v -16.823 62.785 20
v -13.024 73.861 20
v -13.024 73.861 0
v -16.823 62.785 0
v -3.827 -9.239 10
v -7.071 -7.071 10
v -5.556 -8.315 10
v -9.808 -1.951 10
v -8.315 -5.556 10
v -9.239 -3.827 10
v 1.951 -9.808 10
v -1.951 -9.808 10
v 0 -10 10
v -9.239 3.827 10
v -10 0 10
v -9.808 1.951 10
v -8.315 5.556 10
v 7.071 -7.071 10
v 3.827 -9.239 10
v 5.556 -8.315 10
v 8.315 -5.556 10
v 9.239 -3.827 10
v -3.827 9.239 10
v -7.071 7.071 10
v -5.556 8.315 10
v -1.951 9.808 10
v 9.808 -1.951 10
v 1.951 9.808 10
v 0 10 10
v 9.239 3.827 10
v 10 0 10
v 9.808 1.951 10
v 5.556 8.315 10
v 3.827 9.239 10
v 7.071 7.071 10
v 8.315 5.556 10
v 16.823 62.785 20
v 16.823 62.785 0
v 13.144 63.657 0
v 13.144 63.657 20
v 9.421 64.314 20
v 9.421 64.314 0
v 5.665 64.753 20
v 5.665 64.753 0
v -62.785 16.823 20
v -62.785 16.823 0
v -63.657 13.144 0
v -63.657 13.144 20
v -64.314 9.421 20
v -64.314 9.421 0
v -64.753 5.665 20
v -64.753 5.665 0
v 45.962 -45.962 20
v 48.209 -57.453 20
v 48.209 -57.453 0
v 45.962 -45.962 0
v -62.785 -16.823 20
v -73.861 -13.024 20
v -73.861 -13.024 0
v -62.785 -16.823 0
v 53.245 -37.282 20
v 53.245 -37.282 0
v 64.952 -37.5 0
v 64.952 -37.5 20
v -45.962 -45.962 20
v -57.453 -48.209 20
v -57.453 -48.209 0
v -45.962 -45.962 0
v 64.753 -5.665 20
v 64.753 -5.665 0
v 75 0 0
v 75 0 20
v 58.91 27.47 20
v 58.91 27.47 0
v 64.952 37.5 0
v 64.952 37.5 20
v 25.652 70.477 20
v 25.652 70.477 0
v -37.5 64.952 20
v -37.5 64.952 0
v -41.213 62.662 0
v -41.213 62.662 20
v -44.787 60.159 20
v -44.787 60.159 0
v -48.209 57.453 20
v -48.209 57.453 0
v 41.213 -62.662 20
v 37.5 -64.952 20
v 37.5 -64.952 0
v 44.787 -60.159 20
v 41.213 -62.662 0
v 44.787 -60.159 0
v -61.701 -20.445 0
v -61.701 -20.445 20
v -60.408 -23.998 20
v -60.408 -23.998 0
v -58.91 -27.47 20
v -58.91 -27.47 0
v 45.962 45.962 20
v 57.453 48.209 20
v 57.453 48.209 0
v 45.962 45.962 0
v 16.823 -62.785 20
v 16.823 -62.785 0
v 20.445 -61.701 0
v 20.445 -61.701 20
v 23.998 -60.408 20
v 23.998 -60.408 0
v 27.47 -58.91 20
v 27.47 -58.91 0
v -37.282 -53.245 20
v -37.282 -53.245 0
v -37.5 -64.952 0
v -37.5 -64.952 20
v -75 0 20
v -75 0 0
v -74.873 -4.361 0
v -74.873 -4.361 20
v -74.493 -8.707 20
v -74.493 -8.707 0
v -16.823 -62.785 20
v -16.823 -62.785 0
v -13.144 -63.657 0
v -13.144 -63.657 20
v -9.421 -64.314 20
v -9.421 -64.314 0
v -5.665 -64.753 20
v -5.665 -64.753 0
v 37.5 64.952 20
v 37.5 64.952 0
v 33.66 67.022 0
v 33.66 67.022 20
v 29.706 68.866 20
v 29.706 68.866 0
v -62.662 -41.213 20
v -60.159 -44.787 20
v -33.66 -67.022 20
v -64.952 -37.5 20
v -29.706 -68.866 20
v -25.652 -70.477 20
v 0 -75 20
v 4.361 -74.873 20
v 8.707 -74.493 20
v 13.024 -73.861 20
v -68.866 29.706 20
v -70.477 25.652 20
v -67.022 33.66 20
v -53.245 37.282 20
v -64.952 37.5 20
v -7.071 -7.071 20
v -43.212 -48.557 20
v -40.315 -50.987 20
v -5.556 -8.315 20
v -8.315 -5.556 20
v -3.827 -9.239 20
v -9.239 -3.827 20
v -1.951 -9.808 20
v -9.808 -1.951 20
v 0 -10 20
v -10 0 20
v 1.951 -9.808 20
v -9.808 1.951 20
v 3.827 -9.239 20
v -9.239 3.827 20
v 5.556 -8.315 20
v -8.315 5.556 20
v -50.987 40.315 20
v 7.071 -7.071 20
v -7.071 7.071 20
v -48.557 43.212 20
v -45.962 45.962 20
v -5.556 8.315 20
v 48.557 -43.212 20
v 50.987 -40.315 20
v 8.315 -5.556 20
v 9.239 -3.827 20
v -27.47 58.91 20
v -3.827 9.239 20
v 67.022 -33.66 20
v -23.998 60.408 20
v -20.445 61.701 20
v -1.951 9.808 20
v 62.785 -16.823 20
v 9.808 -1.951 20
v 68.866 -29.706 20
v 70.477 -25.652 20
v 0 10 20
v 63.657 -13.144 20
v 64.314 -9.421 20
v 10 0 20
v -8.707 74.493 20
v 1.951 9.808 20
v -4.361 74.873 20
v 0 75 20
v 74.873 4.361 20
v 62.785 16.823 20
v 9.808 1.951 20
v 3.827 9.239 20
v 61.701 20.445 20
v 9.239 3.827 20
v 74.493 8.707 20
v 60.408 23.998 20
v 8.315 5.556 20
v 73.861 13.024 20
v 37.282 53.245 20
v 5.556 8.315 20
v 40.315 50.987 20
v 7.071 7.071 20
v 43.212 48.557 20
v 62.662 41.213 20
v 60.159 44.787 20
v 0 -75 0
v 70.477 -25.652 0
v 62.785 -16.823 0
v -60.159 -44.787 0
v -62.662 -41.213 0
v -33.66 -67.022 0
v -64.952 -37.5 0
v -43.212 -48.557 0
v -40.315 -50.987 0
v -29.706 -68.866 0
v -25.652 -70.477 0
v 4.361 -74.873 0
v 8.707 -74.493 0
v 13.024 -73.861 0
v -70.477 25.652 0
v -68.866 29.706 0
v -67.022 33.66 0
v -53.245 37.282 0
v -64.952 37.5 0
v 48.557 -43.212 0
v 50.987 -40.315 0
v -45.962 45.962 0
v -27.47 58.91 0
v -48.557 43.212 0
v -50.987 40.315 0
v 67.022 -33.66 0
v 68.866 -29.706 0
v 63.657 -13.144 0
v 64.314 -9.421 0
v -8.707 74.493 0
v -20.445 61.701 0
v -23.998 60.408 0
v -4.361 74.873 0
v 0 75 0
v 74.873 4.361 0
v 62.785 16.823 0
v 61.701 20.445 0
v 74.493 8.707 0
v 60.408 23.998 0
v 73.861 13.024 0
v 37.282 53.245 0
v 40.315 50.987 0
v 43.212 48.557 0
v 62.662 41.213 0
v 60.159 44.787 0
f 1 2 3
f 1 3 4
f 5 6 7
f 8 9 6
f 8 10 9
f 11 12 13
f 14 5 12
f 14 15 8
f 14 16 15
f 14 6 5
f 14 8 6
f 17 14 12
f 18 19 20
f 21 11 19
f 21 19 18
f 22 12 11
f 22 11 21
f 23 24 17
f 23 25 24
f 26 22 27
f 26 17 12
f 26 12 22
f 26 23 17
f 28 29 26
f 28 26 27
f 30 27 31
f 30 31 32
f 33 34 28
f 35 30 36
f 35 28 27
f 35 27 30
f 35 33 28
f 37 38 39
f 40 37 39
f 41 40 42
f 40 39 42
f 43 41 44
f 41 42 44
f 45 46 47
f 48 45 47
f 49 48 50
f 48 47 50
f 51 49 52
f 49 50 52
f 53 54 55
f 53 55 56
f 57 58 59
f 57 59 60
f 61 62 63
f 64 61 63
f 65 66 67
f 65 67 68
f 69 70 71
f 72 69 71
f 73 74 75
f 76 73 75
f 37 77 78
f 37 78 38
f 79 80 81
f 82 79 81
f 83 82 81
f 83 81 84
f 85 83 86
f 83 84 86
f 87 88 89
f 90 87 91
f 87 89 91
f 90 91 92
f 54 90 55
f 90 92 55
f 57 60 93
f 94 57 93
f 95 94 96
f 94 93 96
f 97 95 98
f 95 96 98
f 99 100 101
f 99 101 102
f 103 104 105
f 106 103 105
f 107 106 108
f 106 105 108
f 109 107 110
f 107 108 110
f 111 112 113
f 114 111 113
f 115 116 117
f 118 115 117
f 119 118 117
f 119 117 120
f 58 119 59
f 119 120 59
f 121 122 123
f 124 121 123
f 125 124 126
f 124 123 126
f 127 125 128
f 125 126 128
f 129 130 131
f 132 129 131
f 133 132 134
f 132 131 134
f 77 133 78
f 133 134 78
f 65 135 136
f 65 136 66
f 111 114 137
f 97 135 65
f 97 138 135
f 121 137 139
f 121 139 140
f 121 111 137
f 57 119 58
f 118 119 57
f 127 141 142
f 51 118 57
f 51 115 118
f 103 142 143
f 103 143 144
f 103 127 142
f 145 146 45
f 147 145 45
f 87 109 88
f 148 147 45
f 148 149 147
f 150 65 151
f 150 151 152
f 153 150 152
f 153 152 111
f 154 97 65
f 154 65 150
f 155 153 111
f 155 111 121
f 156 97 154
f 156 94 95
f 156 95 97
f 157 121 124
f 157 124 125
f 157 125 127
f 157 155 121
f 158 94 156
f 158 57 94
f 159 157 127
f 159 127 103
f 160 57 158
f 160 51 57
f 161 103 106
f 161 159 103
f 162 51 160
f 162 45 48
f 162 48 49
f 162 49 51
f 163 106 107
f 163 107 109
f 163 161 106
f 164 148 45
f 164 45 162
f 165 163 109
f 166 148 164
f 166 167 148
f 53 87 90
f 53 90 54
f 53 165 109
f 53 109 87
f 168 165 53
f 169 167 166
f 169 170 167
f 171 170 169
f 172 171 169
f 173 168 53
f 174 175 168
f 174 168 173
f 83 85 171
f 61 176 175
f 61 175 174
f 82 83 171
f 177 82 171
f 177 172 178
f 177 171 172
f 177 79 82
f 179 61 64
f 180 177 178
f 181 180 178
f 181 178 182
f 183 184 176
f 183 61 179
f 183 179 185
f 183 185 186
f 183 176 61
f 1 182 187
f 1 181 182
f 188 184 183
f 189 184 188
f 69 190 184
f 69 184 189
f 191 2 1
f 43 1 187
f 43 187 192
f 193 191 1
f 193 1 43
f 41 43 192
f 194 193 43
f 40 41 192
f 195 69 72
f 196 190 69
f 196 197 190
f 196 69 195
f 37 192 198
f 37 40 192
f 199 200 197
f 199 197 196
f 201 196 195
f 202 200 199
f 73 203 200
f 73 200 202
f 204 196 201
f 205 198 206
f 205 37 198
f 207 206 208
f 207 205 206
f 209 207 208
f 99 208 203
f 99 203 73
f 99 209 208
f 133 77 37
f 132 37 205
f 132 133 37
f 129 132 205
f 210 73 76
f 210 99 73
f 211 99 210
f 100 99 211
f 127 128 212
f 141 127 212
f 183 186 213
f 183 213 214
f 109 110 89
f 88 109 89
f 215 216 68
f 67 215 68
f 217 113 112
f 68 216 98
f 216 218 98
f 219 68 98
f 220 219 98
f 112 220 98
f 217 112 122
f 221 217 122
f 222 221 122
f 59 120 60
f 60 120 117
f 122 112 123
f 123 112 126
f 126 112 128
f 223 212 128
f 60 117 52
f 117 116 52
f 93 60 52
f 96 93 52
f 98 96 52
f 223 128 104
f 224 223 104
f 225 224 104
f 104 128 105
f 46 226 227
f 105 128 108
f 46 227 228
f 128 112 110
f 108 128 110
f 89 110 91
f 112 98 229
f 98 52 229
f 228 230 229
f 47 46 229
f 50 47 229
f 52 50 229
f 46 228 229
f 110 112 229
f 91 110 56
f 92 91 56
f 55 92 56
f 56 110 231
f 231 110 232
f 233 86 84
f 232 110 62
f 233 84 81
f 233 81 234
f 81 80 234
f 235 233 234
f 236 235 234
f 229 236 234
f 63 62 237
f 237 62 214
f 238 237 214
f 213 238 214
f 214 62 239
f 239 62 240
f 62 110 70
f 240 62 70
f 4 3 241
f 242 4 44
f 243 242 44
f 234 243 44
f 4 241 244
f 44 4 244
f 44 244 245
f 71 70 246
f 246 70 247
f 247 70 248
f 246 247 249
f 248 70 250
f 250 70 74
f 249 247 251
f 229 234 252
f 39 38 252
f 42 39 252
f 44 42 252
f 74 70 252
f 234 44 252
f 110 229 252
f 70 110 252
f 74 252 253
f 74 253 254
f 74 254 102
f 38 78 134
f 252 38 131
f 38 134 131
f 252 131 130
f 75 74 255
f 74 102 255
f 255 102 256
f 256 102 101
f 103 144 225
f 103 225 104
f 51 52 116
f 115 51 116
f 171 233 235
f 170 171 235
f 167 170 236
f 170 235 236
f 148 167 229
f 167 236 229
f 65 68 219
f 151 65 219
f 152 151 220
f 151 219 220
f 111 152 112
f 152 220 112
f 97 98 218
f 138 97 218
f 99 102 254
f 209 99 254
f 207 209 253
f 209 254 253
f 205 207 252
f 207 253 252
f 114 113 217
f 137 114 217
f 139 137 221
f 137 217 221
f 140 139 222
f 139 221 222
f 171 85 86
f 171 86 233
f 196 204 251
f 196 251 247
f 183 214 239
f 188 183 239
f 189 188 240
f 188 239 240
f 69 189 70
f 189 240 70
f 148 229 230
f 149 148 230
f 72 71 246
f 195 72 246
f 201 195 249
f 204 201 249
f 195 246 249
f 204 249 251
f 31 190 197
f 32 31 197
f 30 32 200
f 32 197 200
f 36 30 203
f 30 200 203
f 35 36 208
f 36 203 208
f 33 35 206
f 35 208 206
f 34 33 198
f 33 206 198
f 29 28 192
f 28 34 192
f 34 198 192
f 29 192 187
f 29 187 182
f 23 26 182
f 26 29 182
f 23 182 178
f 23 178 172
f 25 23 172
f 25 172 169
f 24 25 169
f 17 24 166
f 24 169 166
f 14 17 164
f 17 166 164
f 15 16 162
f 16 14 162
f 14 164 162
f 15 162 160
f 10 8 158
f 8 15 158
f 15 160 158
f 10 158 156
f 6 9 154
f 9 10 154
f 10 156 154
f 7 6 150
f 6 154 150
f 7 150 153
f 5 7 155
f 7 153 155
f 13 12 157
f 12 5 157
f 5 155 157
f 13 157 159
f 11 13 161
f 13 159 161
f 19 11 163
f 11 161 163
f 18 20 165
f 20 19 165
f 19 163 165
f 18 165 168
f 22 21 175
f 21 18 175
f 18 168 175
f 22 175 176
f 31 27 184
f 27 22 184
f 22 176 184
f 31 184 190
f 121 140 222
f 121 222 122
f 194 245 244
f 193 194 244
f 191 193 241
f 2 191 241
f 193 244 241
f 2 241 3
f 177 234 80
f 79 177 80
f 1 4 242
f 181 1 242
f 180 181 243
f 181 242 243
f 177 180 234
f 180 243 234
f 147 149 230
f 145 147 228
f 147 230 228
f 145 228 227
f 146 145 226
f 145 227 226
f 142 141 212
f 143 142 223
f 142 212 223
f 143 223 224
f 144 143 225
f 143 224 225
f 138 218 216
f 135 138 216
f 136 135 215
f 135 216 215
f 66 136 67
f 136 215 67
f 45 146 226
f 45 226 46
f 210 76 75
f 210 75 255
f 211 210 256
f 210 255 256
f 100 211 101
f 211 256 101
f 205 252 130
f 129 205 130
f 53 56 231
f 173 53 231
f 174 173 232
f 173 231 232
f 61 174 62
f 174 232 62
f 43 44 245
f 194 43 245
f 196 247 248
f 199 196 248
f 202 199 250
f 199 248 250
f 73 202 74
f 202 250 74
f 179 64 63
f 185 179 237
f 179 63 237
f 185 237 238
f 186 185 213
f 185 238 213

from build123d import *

# Parameters (mm, degrees)
CROQUIS1_R              = 75
SALIENTE_EXTRUIR1_DEPTH = 20
CROQUIS3_R              = 10
CORTAR_EXTRUIR2_DEPTH   = 10
CORTAR_EXTRUIR3_START   = -20
CORTAR_EXTRUIR3_DEPTH   = 20
MATRIZC3_COUNT          = 12


with BuildPart() as part:
    # Croquis1 → Saliente-Extruir1 (new body)
    with BuildSketch(Plane.XY):
        Circle(CROQUIS1_R)
    extrude(amount=SALIENTE_EXTRUIR1_DEPTH)

    # Croquis3 → Cortar-Extruir2 (cut)
    with BuildSketch(Plane.XY.offset(20)):
        Circle(CROQUIS3_R)
    cortar_extruir2 = extrude(amount=-CORTAR_EXTRUIR2_DEPTH, mode=Mode.SUBTRACT)

    # Croquis2 → Cortar-Extruir3 (cut)
    with BuildSketch(Plane.XY.offset(20).offset(CORTAR_EXTRUIR3_START)):
        with BuildLine():
            Line((64.752655376, -5.665123279), (75, 0))
            ThreePointArc((75, 0), (73.860581476, -13.023613325), (70.476946559, -25.651510749))
            Line((70.476946559, -25.651510749), (62.785178709, -16.823237932))
            ThreePointArc((62.785178709, -16.823237932), (64.012503946, -11.287131548), (64.752655376, -5.665123279))
        make_face()
    cortar_extruir3 = extrude(amount=CORTAR_EXTRUIR3_DEPTH, mode=Mode.SUBTRACT)

    # MatrizC3: Cortar-Extruir2, Cortar-Extruir3 ×12 about axis
    matrizc3_axis = Axis((0, 0, 0), (0, 0, 1))
    add([cortar_extruir2.rotate(matrizc3_axis, i * 360 / MATRIZC3_COUNT) for i in range(1, MATRIZC3_COUNT)], mode=Mode.SUBTRACT)
    add([cortar_extruir3.rotate(matrizc3_axis, i * 360 / MATRIZC3_COUNT) for i in range(1, MATRIZC3_COUNT)], mode=Mode.SUBTRACT)


solid = part.part
